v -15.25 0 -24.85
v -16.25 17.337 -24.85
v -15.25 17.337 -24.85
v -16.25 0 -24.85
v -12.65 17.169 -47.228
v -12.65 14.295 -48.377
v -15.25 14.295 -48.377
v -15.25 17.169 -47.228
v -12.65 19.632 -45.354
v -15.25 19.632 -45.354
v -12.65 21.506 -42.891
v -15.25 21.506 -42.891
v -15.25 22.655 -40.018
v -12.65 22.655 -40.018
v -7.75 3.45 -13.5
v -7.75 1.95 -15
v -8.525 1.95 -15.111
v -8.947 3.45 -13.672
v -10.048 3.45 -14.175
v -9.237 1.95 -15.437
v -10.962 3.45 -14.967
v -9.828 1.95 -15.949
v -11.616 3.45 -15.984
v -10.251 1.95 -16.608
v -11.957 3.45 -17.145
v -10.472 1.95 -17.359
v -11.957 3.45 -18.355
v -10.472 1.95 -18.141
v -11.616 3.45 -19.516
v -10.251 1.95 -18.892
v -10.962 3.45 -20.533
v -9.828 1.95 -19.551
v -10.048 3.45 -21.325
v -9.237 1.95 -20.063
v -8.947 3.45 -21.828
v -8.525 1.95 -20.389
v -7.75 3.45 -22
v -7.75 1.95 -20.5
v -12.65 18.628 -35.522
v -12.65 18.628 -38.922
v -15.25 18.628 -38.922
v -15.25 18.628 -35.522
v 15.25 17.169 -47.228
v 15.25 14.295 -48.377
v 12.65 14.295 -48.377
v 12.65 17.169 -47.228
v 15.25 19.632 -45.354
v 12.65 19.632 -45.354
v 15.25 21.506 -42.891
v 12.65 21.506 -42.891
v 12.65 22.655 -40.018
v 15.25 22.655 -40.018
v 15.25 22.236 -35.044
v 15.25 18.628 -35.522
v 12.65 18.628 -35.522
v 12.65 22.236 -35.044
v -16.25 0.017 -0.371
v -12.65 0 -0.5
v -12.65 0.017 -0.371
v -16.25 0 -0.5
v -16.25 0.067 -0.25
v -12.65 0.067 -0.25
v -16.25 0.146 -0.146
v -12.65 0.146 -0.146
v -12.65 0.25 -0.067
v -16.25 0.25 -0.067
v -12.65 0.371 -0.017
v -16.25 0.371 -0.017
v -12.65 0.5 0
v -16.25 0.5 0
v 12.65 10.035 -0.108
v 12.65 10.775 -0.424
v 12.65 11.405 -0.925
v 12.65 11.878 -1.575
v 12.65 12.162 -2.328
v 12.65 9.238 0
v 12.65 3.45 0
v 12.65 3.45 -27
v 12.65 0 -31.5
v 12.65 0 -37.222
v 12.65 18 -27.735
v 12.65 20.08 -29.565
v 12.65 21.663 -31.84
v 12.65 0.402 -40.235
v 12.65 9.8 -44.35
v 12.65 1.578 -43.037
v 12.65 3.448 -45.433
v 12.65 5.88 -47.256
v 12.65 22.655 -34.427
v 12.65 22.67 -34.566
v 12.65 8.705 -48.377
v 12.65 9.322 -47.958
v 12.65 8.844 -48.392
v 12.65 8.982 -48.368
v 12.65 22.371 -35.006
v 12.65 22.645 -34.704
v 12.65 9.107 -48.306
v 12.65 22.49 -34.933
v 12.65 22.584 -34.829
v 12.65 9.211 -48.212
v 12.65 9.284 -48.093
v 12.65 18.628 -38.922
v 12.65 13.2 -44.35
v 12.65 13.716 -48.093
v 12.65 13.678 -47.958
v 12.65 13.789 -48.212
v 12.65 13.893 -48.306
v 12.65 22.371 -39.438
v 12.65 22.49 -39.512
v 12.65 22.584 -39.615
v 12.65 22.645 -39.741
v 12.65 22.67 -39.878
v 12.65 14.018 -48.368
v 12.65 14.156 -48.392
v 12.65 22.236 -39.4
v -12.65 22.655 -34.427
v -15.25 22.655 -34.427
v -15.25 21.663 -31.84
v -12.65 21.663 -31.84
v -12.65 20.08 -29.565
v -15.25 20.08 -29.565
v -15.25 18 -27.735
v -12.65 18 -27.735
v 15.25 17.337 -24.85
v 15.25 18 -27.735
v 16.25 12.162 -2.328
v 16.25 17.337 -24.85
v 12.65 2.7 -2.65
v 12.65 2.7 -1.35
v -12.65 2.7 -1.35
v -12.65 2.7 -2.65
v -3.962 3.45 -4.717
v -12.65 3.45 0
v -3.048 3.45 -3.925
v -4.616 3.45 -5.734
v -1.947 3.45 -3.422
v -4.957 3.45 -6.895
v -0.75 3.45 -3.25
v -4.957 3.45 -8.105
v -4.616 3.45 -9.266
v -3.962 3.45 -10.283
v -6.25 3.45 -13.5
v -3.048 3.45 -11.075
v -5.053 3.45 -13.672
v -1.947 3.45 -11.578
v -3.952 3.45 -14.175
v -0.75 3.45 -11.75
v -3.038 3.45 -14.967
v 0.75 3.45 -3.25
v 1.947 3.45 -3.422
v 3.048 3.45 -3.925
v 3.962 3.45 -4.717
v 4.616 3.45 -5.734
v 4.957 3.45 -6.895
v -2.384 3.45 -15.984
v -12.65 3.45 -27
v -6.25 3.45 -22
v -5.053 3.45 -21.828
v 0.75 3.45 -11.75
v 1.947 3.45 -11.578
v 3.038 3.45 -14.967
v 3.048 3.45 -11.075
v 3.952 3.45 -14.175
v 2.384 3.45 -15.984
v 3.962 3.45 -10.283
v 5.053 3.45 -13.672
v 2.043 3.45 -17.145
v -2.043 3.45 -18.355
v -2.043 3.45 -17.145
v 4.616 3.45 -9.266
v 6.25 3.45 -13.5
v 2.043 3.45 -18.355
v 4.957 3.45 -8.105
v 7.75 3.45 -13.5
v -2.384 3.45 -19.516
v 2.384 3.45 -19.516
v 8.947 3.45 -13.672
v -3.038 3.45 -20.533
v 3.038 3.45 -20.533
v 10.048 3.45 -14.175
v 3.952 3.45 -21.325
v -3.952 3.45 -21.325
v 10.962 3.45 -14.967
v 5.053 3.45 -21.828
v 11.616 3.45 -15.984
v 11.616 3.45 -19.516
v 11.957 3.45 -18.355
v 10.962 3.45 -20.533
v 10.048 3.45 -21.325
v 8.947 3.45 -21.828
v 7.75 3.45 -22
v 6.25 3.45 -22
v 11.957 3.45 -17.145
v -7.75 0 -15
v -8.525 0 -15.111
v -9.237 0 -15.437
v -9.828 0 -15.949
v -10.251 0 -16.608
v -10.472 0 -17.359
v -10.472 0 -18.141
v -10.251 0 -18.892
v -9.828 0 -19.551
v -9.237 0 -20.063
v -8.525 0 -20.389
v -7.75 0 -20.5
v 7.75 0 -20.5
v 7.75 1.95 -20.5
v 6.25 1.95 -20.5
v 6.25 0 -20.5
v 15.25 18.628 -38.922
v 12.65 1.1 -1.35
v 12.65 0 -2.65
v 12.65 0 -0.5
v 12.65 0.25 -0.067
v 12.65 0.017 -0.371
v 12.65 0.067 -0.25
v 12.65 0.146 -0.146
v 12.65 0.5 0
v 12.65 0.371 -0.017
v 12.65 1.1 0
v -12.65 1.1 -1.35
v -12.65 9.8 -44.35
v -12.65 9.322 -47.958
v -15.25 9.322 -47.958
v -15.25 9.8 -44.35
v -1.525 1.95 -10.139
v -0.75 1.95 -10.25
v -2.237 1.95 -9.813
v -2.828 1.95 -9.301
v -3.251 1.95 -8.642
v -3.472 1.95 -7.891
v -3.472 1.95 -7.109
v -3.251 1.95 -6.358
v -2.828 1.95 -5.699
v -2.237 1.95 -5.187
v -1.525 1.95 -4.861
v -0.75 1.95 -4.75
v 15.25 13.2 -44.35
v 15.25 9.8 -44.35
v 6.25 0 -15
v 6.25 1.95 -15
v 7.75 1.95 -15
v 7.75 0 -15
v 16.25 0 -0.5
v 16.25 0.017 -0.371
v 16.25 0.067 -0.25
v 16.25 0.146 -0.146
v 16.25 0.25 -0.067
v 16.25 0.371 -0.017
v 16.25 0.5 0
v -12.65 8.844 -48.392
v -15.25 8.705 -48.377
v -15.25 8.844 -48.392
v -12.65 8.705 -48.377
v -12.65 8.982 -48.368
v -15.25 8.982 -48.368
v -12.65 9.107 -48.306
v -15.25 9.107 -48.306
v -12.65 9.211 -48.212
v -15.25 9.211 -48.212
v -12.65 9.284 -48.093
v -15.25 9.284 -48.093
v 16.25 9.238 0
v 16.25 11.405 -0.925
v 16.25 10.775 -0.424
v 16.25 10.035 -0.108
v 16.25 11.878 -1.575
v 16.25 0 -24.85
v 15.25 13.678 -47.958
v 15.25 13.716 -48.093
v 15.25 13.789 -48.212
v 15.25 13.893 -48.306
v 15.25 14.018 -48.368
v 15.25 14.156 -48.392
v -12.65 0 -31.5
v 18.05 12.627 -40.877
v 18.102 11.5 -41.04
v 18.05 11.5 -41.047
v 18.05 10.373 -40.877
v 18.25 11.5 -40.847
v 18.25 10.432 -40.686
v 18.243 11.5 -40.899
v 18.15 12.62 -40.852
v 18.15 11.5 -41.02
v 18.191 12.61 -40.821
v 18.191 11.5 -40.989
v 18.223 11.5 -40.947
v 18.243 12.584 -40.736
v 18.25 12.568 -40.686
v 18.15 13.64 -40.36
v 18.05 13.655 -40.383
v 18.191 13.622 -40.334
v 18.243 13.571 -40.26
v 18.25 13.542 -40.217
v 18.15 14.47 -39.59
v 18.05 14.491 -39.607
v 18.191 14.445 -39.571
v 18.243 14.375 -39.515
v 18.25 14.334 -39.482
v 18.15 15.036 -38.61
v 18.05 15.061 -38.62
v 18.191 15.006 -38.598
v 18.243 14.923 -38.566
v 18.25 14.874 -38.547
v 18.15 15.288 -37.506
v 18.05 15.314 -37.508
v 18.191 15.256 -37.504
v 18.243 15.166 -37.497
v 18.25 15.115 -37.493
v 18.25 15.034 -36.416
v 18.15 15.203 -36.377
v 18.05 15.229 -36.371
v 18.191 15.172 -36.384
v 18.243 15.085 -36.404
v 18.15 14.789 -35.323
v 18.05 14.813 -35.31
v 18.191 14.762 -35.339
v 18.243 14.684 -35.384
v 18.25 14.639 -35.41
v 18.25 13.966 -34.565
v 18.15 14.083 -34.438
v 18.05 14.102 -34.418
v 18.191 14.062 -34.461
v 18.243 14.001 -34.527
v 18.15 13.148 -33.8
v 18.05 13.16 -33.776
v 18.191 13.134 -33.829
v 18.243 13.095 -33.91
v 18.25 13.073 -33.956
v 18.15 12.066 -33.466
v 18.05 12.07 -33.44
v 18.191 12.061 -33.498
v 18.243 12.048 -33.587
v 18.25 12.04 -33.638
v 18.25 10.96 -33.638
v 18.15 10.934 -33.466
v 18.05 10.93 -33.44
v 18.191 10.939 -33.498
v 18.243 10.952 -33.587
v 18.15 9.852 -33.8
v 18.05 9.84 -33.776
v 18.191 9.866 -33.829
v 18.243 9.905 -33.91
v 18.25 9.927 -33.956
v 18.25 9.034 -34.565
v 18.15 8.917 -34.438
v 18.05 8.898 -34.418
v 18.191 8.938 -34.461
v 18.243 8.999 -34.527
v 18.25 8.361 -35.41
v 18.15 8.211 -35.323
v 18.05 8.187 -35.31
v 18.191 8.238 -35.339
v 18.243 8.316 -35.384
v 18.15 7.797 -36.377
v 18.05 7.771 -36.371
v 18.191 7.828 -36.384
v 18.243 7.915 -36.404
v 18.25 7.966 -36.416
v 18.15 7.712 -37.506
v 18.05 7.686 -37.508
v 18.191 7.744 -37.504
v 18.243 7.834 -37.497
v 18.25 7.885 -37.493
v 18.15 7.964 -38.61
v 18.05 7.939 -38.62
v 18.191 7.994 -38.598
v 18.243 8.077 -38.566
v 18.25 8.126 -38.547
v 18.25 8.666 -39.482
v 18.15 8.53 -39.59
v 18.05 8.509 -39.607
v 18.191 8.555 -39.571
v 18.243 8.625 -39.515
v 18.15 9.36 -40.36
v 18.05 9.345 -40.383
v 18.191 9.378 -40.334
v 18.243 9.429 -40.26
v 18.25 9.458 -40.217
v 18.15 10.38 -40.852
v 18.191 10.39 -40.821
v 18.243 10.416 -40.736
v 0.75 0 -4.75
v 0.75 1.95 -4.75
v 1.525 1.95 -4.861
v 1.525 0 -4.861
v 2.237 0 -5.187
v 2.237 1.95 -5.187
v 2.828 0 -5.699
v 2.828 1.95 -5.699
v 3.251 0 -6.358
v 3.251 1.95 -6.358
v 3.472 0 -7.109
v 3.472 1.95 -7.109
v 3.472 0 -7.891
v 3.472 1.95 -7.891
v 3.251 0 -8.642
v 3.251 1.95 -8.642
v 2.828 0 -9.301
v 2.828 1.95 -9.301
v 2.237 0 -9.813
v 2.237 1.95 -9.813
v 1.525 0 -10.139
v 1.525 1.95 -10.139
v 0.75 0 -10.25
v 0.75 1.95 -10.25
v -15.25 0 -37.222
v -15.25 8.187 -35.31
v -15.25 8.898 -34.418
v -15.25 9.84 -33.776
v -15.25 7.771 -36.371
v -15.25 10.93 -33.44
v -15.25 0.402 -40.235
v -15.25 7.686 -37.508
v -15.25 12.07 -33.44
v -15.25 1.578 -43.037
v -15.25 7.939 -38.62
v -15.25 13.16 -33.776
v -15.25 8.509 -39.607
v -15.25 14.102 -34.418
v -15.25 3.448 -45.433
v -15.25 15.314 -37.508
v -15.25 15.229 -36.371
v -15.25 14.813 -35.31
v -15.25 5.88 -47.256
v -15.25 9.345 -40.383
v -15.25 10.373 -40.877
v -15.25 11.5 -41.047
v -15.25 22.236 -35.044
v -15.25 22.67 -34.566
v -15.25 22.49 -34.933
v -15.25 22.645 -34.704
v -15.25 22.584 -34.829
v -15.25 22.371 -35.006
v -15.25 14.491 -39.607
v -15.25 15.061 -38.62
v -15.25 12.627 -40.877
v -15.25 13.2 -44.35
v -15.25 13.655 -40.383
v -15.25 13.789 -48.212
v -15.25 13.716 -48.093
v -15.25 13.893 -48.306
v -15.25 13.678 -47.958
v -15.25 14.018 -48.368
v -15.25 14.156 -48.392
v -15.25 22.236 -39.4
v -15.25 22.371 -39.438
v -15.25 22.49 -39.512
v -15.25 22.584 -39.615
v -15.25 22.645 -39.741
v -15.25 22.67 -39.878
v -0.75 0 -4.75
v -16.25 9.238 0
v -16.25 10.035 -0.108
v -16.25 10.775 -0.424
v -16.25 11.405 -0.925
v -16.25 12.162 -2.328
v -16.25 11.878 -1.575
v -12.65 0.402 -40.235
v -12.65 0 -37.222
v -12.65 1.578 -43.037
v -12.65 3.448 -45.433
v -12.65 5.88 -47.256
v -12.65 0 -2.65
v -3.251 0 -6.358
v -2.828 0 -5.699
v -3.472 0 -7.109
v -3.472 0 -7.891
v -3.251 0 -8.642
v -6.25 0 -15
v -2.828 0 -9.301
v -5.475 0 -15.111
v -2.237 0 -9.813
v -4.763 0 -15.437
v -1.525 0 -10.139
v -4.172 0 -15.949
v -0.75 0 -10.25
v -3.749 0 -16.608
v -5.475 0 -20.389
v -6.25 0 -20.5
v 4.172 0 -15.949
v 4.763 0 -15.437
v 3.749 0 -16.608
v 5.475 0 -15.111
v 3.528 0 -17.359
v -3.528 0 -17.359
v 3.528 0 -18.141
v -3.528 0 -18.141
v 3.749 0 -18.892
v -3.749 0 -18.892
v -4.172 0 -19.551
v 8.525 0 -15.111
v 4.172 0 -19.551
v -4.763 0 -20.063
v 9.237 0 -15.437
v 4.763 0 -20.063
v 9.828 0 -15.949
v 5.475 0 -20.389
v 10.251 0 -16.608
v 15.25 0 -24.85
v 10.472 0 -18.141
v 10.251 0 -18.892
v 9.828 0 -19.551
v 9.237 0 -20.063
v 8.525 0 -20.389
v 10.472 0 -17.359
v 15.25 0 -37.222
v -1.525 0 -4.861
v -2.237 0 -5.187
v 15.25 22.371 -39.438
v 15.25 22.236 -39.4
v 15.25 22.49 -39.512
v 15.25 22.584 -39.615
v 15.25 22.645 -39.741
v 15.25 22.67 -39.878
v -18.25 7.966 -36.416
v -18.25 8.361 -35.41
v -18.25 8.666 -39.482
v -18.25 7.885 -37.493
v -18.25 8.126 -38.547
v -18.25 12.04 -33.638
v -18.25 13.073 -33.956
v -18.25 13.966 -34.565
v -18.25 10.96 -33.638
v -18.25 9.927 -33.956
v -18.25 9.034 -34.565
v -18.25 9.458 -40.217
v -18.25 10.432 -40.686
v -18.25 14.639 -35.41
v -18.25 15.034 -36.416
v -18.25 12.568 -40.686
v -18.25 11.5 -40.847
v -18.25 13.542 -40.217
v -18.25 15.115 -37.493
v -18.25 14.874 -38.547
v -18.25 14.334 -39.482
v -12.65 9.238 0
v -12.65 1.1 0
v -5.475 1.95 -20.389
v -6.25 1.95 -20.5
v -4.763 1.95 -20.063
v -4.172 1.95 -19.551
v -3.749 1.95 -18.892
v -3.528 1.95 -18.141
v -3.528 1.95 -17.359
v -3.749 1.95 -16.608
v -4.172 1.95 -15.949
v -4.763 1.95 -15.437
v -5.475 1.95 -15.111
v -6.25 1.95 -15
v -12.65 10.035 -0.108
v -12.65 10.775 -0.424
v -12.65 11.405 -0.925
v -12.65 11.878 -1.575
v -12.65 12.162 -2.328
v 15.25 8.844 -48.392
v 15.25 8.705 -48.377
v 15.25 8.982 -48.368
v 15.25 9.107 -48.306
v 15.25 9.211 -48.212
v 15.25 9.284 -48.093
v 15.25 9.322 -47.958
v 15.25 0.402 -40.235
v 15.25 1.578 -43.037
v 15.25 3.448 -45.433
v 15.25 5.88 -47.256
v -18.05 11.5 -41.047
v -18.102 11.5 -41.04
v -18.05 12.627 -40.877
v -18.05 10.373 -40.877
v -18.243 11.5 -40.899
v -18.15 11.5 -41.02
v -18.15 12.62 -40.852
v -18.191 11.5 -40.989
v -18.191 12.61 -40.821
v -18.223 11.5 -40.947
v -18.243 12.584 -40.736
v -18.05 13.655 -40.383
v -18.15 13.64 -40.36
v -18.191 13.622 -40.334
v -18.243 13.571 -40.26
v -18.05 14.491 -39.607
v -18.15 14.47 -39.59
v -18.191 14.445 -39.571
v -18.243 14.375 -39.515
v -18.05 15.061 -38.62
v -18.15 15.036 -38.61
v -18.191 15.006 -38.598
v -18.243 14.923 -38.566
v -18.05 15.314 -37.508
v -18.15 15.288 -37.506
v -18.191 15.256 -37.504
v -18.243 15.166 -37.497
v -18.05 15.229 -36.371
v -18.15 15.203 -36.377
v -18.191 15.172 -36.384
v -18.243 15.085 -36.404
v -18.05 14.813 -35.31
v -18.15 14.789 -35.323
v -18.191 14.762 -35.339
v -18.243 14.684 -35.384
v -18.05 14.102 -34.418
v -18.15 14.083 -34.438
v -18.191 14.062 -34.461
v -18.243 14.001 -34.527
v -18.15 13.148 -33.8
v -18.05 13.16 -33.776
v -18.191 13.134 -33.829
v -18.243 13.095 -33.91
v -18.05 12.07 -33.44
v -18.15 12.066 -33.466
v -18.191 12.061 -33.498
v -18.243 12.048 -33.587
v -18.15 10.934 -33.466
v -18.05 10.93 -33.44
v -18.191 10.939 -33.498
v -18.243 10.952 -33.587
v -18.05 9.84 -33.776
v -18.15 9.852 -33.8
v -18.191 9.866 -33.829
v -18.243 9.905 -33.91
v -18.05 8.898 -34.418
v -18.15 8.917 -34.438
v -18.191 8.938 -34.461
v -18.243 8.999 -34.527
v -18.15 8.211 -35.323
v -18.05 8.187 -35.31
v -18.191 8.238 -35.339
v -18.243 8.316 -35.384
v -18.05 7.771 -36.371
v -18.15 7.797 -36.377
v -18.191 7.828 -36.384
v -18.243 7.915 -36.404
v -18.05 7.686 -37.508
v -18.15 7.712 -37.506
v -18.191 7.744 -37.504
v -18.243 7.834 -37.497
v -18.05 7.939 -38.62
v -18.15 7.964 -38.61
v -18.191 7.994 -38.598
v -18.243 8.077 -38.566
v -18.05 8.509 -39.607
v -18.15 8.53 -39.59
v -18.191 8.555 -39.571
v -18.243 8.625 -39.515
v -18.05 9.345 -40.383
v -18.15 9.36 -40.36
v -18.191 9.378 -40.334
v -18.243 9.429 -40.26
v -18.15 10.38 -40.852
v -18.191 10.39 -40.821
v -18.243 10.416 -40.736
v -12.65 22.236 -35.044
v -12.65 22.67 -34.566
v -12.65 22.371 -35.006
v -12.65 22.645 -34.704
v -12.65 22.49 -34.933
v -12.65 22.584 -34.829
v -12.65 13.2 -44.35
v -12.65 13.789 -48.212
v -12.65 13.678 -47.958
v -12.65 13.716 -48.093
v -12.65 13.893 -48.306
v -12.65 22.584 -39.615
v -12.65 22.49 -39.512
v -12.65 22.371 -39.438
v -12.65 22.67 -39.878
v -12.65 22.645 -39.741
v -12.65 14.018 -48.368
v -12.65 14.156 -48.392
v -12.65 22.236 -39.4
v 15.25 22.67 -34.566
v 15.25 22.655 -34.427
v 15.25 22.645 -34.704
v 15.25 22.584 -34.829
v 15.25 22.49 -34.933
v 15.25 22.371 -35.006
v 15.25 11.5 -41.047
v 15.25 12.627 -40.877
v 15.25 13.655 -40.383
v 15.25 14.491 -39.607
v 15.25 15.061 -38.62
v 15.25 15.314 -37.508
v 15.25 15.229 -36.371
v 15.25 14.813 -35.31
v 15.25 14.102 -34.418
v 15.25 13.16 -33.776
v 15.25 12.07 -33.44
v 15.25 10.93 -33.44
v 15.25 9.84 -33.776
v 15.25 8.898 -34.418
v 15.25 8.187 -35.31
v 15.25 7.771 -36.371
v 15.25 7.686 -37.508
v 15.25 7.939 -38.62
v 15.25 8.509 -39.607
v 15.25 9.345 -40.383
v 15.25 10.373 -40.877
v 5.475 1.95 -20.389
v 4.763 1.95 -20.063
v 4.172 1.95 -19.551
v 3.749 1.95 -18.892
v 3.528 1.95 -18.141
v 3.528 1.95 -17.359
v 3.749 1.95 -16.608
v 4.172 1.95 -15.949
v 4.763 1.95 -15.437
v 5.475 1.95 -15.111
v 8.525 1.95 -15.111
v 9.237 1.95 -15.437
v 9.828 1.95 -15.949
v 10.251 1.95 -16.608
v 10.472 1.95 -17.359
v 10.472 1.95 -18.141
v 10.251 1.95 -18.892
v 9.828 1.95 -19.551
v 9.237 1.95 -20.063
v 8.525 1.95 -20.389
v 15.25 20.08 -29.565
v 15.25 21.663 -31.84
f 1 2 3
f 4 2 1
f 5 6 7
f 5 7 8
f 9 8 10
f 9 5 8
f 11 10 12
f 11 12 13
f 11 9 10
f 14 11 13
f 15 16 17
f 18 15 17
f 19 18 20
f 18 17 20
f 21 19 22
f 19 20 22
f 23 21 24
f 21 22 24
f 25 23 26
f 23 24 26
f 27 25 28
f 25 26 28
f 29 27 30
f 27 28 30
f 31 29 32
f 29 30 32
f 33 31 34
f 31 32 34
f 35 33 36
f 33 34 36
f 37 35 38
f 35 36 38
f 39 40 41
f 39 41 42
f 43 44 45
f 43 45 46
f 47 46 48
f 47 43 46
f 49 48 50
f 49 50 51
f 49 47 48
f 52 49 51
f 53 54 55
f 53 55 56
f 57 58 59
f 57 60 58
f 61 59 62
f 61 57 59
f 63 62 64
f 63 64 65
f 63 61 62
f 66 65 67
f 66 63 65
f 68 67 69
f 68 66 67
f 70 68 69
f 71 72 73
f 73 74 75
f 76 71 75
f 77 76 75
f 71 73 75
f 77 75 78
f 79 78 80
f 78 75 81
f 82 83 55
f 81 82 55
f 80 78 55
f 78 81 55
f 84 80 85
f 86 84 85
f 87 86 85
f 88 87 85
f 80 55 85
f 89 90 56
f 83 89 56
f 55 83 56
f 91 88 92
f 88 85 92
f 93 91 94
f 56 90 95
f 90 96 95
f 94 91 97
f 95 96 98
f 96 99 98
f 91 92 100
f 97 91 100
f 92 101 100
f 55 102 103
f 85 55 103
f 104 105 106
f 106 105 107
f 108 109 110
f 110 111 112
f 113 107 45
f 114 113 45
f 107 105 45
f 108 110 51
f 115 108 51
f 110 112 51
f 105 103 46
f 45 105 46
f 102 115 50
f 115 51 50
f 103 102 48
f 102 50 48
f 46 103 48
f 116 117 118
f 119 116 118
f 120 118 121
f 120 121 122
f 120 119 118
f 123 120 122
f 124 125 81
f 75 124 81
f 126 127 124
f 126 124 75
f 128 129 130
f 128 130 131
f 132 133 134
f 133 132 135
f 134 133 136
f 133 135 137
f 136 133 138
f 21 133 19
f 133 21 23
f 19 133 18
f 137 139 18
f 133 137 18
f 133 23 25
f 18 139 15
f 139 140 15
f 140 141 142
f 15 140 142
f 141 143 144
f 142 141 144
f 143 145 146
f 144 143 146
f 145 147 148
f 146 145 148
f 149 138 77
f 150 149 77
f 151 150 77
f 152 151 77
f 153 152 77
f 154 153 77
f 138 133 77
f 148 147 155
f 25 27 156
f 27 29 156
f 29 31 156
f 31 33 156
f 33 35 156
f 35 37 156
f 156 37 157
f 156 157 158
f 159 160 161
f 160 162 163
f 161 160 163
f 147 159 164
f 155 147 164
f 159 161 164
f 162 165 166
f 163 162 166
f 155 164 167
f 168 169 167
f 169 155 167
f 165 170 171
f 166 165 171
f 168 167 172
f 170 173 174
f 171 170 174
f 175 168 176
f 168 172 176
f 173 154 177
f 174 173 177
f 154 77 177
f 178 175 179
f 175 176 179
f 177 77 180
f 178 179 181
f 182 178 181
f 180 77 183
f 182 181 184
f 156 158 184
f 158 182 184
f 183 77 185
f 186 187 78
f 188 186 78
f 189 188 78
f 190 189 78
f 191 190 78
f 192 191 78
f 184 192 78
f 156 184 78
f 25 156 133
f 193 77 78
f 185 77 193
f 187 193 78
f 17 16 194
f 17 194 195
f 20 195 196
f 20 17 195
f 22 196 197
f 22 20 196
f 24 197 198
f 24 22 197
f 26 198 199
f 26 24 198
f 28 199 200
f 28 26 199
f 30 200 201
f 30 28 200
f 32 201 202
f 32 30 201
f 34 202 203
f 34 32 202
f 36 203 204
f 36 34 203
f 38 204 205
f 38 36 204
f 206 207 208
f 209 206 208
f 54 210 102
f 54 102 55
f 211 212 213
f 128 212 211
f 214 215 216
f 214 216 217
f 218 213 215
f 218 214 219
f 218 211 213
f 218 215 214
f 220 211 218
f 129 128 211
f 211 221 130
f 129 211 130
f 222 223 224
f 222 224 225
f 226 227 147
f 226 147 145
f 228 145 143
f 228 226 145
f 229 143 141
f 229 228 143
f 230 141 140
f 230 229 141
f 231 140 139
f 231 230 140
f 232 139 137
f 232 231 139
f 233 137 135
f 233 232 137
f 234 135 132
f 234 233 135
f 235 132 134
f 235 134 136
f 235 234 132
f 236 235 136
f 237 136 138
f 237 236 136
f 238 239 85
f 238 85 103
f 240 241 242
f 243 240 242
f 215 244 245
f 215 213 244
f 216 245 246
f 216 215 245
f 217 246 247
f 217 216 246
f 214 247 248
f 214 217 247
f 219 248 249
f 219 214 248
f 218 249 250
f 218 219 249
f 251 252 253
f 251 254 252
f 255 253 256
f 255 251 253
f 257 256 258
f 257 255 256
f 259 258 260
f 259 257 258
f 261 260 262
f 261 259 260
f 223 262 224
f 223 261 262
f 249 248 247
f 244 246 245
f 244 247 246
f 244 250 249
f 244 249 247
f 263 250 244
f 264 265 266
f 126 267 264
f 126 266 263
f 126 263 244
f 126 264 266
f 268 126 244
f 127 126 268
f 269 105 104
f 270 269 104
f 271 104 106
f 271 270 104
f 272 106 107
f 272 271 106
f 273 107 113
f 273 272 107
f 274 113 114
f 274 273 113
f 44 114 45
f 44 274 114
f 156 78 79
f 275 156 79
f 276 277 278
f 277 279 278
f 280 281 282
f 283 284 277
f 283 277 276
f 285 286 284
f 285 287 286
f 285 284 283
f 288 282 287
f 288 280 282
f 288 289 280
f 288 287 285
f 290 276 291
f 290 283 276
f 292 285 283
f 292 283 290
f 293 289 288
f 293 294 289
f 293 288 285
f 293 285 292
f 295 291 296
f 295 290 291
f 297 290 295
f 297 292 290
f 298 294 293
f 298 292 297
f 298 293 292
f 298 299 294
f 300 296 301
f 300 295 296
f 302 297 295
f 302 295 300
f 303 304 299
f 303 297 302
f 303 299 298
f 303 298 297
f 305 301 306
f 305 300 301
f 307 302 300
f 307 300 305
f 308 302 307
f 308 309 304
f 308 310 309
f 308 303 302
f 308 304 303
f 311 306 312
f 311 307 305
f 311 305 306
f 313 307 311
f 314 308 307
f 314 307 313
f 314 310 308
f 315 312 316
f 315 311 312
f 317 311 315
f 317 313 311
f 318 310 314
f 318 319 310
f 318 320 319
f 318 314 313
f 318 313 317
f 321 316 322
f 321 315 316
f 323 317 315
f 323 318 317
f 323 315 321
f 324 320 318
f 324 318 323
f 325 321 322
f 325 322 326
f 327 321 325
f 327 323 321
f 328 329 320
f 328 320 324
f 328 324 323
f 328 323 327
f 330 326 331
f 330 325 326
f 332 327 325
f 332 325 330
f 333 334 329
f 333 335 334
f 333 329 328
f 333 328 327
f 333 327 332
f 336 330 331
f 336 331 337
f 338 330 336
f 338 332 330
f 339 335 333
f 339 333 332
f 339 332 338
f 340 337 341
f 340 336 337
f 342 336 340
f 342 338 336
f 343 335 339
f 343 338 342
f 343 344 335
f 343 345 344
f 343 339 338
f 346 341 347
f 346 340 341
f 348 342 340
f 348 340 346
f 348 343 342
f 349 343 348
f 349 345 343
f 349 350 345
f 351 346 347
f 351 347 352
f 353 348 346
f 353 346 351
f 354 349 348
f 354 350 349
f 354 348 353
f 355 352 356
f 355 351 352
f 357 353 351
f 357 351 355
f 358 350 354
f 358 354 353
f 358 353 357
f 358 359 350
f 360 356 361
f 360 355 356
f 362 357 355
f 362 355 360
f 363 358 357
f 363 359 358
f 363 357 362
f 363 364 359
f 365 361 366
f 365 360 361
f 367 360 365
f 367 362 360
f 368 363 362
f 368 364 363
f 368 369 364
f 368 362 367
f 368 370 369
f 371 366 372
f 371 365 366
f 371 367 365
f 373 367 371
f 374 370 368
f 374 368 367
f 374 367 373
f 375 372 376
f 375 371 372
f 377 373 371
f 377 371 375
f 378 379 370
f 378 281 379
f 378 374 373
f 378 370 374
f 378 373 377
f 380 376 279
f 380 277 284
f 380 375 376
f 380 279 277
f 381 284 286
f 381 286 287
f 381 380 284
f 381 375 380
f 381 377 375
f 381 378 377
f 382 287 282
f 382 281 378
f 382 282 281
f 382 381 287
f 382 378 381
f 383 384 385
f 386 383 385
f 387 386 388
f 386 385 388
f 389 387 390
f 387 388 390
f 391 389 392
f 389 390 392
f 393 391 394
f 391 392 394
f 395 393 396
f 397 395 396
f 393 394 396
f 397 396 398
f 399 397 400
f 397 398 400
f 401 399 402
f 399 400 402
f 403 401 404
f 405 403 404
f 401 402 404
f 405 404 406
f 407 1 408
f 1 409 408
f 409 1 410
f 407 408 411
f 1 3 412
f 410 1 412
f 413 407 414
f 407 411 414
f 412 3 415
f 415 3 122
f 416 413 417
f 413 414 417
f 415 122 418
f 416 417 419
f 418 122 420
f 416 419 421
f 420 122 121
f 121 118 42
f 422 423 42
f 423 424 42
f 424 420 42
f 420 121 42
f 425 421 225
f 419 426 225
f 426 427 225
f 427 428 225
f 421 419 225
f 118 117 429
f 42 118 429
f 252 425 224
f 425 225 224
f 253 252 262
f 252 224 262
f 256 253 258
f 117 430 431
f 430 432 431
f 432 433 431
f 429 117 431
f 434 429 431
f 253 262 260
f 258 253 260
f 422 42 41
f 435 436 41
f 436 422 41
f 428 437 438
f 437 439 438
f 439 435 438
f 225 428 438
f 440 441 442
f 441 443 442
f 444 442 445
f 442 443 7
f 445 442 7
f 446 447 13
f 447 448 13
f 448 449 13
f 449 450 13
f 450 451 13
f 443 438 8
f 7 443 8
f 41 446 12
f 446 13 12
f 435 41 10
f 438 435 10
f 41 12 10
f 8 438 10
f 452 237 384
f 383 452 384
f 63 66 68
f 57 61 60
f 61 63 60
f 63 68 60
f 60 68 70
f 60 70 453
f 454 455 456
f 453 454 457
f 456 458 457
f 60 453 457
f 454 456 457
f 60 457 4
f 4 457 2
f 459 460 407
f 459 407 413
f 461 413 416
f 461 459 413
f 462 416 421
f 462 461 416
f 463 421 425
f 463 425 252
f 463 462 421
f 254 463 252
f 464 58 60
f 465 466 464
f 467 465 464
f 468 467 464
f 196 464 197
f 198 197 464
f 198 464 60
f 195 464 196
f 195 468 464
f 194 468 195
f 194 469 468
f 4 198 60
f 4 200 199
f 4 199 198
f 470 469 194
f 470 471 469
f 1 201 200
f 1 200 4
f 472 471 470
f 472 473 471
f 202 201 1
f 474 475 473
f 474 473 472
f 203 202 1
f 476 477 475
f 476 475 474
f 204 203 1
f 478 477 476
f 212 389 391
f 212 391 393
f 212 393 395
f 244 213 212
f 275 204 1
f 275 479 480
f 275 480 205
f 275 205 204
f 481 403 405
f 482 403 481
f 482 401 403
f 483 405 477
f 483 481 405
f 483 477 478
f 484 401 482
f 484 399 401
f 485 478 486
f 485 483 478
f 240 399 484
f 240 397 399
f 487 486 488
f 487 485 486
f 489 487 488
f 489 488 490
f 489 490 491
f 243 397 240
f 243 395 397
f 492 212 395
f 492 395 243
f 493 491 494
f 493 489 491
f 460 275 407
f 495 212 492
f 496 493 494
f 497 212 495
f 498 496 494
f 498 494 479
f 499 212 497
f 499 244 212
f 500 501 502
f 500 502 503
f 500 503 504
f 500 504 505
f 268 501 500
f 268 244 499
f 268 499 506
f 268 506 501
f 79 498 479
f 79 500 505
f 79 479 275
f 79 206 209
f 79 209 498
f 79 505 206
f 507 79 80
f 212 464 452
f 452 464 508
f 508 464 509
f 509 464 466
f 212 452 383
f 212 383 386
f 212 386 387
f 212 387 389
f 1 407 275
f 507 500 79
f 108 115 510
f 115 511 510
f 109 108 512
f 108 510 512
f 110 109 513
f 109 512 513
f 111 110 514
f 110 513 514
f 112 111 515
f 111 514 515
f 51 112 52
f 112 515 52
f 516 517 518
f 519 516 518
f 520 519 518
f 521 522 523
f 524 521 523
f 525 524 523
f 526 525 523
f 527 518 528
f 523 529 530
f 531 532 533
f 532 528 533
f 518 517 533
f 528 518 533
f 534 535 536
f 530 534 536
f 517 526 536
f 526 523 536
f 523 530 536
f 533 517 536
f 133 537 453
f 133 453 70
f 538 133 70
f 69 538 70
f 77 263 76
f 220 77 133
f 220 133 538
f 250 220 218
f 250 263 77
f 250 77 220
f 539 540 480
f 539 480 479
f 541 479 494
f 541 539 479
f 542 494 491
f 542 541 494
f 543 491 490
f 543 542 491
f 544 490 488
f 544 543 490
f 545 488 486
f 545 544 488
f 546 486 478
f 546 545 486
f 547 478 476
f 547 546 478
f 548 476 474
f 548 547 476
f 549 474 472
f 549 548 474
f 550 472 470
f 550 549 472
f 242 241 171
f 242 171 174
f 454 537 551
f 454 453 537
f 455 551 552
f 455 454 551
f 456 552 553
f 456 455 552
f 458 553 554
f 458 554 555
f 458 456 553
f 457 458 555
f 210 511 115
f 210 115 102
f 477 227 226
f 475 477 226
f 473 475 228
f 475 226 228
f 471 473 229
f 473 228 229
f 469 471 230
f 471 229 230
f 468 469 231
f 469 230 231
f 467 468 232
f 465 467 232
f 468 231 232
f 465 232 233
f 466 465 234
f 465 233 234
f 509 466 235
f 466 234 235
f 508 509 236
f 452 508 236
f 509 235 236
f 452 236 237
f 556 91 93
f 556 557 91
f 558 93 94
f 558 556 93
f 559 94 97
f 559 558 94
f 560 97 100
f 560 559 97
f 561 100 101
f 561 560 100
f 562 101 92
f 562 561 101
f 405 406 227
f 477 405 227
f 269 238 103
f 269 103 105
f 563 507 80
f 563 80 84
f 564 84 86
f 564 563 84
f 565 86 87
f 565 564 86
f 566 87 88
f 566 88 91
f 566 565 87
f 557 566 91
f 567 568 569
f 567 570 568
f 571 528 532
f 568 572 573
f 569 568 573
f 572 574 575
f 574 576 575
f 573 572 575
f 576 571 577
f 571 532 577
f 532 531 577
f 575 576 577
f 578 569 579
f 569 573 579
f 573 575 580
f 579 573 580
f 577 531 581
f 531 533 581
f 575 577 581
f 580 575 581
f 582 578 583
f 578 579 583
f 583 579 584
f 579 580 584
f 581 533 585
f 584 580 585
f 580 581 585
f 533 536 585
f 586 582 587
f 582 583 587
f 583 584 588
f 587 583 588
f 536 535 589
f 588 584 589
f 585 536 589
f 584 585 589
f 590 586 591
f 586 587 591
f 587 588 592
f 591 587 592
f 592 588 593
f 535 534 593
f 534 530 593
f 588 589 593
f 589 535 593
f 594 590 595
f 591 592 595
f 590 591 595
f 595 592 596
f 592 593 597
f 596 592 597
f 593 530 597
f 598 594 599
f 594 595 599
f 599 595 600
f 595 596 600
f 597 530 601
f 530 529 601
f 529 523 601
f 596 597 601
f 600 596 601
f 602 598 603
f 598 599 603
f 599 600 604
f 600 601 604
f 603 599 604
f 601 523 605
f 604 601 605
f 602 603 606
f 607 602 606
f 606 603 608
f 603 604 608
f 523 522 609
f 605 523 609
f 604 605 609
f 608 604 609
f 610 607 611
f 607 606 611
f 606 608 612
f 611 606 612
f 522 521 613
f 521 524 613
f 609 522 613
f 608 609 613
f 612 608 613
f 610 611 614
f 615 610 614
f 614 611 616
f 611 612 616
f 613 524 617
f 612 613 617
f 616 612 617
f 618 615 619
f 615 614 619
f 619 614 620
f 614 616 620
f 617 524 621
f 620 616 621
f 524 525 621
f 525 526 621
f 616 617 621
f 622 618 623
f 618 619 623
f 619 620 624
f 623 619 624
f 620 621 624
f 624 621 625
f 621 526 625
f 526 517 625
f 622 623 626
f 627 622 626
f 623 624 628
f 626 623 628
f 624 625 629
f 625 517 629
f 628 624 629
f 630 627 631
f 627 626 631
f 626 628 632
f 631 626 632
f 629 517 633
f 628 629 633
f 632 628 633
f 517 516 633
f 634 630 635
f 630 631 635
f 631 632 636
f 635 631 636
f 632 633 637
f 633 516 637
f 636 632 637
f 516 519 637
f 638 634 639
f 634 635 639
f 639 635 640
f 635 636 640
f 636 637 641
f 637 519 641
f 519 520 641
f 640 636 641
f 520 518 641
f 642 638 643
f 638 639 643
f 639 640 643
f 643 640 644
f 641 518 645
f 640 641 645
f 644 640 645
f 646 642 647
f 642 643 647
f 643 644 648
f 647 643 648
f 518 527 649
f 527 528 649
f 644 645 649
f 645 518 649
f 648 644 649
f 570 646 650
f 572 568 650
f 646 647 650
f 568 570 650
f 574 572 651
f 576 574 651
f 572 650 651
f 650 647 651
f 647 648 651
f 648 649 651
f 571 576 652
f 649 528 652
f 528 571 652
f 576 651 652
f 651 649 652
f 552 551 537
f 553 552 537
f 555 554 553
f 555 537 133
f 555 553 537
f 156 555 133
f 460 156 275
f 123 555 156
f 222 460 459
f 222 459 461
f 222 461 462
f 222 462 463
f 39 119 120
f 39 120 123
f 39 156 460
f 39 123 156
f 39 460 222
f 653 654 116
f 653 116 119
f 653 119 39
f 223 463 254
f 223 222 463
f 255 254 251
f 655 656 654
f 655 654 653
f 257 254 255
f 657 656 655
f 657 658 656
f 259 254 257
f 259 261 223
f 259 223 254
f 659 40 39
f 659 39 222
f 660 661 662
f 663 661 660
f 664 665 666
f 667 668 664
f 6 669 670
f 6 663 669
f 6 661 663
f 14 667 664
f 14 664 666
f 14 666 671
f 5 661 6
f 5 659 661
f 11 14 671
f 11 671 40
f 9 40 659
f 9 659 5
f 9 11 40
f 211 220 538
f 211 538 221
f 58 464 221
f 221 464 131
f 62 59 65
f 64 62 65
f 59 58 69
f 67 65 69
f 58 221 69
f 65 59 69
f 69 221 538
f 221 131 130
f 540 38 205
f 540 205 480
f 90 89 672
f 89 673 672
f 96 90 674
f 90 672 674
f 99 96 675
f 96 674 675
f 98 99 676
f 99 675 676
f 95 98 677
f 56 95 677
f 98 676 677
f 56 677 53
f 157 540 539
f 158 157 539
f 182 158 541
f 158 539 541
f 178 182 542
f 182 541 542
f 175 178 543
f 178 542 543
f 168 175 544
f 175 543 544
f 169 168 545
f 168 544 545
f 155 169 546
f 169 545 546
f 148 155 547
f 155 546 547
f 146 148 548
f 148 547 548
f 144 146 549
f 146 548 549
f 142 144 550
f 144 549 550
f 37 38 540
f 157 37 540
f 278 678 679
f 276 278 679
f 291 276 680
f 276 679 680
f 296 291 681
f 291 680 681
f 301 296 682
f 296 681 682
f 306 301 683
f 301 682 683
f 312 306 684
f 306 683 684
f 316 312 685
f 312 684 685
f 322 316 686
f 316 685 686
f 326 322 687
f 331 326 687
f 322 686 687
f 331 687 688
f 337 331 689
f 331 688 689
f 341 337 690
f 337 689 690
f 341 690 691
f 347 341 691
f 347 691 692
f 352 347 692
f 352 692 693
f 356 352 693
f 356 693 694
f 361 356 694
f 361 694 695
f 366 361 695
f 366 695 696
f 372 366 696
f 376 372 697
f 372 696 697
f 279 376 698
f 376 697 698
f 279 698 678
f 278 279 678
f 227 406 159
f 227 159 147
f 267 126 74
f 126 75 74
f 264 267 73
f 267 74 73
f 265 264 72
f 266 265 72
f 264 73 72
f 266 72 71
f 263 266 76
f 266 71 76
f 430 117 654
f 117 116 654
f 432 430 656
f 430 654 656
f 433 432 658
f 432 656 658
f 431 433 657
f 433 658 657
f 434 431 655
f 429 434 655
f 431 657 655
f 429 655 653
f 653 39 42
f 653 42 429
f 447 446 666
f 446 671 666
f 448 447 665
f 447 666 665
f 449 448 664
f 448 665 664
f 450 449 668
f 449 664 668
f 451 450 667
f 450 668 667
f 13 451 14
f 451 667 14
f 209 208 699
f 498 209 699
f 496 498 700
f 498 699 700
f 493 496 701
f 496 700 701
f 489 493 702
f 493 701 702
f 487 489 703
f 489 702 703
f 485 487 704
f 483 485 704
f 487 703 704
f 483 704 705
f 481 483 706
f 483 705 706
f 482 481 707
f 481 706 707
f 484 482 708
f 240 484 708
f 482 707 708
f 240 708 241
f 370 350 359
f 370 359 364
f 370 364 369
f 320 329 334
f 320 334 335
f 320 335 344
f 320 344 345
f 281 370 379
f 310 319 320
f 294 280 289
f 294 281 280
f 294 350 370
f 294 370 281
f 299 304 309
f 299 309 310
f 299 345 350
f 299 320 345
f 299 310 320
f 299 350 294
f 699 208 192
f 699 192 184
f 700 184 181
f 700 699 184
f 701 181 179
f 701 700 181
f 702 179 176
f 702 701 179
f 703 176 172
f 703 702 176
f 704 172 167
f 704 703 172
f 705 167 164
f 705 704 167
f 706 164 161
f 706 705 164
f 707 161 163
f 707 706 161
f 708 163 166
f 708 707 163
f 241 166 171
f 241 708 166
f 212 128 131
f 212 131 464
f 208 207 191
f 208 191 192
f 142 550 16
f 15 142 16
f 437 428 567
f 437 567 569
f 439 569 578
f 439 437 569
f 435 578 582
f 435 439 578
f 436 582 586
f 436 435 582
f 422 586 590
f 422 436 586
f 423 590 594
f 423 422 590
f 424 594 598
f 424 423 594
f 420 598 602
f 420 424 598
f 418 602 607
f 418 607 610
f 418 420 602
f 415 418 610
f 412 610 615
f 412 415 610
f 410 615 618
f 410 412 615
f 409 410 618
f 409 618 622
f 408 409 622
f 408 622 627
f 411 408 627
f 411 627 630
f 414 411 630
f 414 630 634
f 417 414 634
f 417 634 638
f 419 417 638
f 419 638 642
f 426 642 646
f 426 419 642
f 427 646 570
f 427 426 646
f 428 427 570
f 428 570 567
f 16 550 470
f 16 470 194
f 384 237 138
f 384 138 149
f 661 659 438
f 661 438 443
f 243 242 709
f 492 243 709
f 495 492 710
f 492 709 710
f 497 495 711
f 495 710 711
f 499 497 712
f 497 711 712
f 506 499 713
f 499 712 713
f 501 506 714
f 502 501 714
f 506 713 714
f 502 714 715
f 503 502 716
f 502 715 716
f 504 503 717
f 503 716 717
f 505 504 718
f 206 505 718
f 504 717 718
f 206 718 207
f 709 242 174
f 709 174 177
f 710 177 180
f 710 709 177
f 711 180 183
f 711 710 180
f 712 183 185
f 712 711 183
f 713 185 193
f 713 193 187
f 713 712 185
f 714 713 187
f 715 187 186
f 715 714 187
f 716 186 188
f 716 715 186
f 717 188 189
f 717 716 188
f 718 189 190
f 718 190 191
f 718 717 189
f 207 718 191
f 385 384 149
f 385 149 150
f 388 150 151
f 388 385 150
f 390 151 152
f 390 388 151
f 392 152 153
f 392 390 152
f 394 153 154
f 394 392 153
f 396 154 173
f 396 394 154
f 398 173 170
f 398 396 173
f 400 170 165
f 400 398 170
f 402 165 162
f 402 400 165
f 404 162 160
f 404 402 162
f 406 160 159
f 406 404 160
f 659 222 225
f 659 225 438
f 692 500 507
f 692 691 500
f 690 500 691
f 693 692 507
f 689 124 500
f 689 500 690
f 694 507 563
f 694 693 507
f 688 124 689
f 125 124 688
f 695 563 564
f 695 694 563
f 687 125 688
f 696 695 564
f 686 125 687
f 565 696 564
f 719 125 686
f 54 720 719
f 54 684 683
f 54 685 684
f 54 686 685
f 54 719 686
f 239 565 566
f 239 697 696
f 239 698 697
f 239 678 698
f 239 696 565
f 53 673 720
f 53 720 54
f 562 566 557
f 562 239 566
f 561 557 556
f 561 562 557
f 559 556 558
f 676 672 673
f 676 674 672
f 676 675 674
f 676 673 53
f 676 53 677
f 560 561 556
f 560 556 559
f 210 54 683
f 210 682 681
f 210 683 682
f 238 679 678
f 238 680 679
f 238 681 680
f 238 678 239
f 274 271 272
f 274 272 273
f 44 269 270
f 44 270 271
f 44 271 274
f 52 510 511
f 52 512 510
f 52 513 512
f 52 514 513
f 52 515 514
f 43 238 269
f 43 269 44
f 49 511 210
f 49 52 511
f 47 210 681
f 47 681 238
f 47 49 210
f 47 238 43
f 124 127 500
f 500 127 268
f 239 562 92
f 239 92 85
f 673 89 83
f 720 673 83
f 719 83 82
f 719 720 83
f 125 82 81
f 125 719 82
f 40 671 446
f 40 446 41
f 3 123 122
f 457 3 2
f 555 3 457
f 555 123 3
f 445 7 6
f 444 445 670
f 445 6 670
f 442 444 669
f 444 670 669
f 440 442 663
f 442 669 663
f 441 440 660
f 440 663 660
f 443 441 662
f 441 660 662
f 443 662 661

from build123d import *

# Parameters (mm, degrees)
BOSS_EXTRUDE1_DEPTH = 16.25
CUT_EXTRUDE1_DEPTH  = 1
SKETCH3_R           = 3.825
BOSS_EXTRUDE2_DEPTH = 3
CUT_EXTRUDE2_DEPTH  = 25.3
FILLET1_R           = 0.2
FILLET2_R           = 0.5
FILLET3_R           = 3
CUT_EXTRUDE3_DEPTH  = 4.45
CHAMFER1_SIZE       = 1.5


with BuildPart() as part:
    # Sketch1 → Boss-Extrude1 (new body, symmetric)
    with BuildSketch(Plane(origin=(0, 0, 0), x_dir=(0, 0, -1), z_dir=(1, 0, 0))):
        with BuildLine():
            Line((0, 0), (37.222256431, 0))
            ThreePointArc((37.222256431, 0), (44.515232504, 2.608290378), (48.5, 9.25))
            Line((48.5, 9.25), (44.35, 9.8))
            Line((44.35, 9.8), (44.35, 13.2))
            Line((44.35, 13.2), (48.5, 13.75))
            ThreePointArc((48.5, 13.75), (45.353984415, 19.631727984), (39.472256431, 22.777743569))
            Line((39.472256431, 22.777743569), (38.922256431, 18.627743569))
            Line((38.922256431, 18.627743569), (35.522256431, 18.627743569))
            Line((35.522256431, 18.627743569), (34.972256431, 22.777743569))
            ThreePointArc((34.972256431, 22.777743569), (30.886246606, 21.097133921), (27.735423451, 18))
            Line((27.735423451, 18), (0, 11.626817203))
            Line((0, 11.626817203), (0, 0))
        make_face()
    extrude(amount=BOSS_EXTRUDE1_DEPTH, both=True)

    # Sketch2 → Cut-Extrude1 (cut)
    with BuildSketch(Plane(origin=(16.25, 0, 0), x_dir=(0, 0, -1), z_dir=(1, 0, 0))):
        Polygon((24.85, 17.336973126), (24.85, 0), (48.5, 0), (48.5, 22.777743569), (24.85, 22.777743569), align=None)
    cut_extrude1 = extrude(amount=-CUT_EXTRUDE1_DEPTH, mode=Mode.SUBTRACT)

    # Sketch3 → Boss-Extrude2 (add)
    with BuildSketch(Plane(origin=(15.25, 0, 0), x_dir=(0, 0, -1), z_dir=(1, 0, 0))):
        with Locations((37.222256431, 11.5)):
            Circle(SKETCH3_R)
    boss_extrude2 = extrude(amount=BOSS_EXTRUDE2_DEPTH)

    # Mirror1: Cut-Extrude1, Boss-Extrude2 across plane
    add(cut_extrude1.mirror(Plane(origin=(0, 0, 0), x_dir=(0, 0, 1), z_dir=(1, 0, 0))), mode=Mode.SUBTRACT)
    add(boss_extrude2.mirror(Plane(origin=(0, 0, 0), x_dir=(0, 0, 1), z_dir=(1, 0, 0))))

    # Sketch4 → Cut-Extrude2 (cut)
    with BuildSketch(Plane(origin=(12.65, 0, 0), x_dir=(0, 0, -1), z_dir=(1, 0, 0))):
        Polygon((0, 1.1), (1.35, 1.1), (1.35, 2.7), (2.65, 2.7), (2.65, 0), (0, 0), align=None)
        Polygon((0, 3.45), (27, 3.45), (31.5, 0), (48.5, 0), (48.5, 22.777743569), (0, 22.777743569), align=None)
    extrude(amount=-CUT_EXTRUDE2_DEPTH, mode=Mode.SUBTRACT)

    # Fillet1
    fillet1_edges = [part.edges().sort_by_distance(p)[0] for p in [
        (-18.25, 11.5, -33.397256431),
        (18.25, 11.5, -33.397256431),
    ]]
    fillet(fillet1_edges, radius=FILLET1_R)

    # Fillet2
    fillet2_edges = [part.edges().sort_by_distance(p)[0] for p in [
        (-14.45, 0, 0),
        (-13.95, 22.777743569, -34.972256431),
        (-13.95, 22.777743569, -39.472256431),
        (-13.95, 13.75, -48.5),
        (-13.95, 9.25, -48.5),
        (14.45, 0, 0),
        (13.95, 22.777743569, -34.972256431),
        (13.95, 22.777743569, -39.472256431),
        (13.95, 13.75, -48.5),
        (13.95, 9.25, -48.5),
    ]]
    fillet(fillet2_edges, radius=FILLET2_R)

    # Fillet3
    fillet3_edges = [part.edges().sort_by_distance(p)[0] for p in [
        (-14.45, 11.626817203, 0),
        (14.45, 11.626817203, 0),
    ]]
    fillet(fillet3_edges, radius=FILLET3_R)

    # Sketch5 → Cut-Extrude3 (cut, through all)
    with BuildSketch(Plane(origin=(0, 3.45, 0), x_dir=(1, 0, 0), z_dir=(0, 1, 0))):
        with BuildLine():
            Line((-0.75, 4.75), (0.75, 4.75))
            ThreePointArc((0.75, 4.75), (3.5, 7.5), (0.75, 10.25))
            Line((0.75, 10.25), (-0.75, 10.25))
            ThreePointArc((-0.75, 10.25), (-3.5, 7.5), (-0.75, 4.75))
        make_face()
        with BuildLine():
            Line((7.75, 20.5), (6.25, 20.5))
            ThreePointArc((6.25, 20.5), (3.5, 17.75), (6.25, 15))
            Line((6.25, 15), (7.75, 15))
            ThreePointArc((7.75, 15), (10.5, 17.75), (7.75, 20.5))
        make_face()
        with BuildLine():
            Line((-7.75, 20.5), (-6.25, 20.5))
            ThreePointArc((-6.25, 20.5), (-3.5, 17.75), (-6.25, 15))
            Line((-6.25, 15), (-7.75, 15))
            ThreePointArc((-7.75, 15), (-10.5, 17.75), (-7.75, 20.5))
        make_face()
    extrude(amount=-CUT_EXTRUDE3_DEPTH, mode=Mode.SUBTRACT)

    # Chamfer1
    chamfer1_edges = [part.edges().sort_by_distance(p)[0] for p in [
        (-3.5, 3.45, -7.5),
        (0, 3.45, -4.75),
        (3.5, 3.45, -7.5),
        (0, 3.45, -10.25),
        (10.5, 3.45, -17.75),
        (7, 3.45, -20.5),
        (3.5, 3.45, -17.75),
        (7, 3.45, -15),
        (-10.5, 3.45, -17.75),
        (-7, 3.45, -15),
        (-3.5, 3.45, -17.75),
        (-7, 3.45, -20.5),
    ]]
    chamfer(chamfer1_edges, length=CHAMFER1_SIZE)


solid = part.part
